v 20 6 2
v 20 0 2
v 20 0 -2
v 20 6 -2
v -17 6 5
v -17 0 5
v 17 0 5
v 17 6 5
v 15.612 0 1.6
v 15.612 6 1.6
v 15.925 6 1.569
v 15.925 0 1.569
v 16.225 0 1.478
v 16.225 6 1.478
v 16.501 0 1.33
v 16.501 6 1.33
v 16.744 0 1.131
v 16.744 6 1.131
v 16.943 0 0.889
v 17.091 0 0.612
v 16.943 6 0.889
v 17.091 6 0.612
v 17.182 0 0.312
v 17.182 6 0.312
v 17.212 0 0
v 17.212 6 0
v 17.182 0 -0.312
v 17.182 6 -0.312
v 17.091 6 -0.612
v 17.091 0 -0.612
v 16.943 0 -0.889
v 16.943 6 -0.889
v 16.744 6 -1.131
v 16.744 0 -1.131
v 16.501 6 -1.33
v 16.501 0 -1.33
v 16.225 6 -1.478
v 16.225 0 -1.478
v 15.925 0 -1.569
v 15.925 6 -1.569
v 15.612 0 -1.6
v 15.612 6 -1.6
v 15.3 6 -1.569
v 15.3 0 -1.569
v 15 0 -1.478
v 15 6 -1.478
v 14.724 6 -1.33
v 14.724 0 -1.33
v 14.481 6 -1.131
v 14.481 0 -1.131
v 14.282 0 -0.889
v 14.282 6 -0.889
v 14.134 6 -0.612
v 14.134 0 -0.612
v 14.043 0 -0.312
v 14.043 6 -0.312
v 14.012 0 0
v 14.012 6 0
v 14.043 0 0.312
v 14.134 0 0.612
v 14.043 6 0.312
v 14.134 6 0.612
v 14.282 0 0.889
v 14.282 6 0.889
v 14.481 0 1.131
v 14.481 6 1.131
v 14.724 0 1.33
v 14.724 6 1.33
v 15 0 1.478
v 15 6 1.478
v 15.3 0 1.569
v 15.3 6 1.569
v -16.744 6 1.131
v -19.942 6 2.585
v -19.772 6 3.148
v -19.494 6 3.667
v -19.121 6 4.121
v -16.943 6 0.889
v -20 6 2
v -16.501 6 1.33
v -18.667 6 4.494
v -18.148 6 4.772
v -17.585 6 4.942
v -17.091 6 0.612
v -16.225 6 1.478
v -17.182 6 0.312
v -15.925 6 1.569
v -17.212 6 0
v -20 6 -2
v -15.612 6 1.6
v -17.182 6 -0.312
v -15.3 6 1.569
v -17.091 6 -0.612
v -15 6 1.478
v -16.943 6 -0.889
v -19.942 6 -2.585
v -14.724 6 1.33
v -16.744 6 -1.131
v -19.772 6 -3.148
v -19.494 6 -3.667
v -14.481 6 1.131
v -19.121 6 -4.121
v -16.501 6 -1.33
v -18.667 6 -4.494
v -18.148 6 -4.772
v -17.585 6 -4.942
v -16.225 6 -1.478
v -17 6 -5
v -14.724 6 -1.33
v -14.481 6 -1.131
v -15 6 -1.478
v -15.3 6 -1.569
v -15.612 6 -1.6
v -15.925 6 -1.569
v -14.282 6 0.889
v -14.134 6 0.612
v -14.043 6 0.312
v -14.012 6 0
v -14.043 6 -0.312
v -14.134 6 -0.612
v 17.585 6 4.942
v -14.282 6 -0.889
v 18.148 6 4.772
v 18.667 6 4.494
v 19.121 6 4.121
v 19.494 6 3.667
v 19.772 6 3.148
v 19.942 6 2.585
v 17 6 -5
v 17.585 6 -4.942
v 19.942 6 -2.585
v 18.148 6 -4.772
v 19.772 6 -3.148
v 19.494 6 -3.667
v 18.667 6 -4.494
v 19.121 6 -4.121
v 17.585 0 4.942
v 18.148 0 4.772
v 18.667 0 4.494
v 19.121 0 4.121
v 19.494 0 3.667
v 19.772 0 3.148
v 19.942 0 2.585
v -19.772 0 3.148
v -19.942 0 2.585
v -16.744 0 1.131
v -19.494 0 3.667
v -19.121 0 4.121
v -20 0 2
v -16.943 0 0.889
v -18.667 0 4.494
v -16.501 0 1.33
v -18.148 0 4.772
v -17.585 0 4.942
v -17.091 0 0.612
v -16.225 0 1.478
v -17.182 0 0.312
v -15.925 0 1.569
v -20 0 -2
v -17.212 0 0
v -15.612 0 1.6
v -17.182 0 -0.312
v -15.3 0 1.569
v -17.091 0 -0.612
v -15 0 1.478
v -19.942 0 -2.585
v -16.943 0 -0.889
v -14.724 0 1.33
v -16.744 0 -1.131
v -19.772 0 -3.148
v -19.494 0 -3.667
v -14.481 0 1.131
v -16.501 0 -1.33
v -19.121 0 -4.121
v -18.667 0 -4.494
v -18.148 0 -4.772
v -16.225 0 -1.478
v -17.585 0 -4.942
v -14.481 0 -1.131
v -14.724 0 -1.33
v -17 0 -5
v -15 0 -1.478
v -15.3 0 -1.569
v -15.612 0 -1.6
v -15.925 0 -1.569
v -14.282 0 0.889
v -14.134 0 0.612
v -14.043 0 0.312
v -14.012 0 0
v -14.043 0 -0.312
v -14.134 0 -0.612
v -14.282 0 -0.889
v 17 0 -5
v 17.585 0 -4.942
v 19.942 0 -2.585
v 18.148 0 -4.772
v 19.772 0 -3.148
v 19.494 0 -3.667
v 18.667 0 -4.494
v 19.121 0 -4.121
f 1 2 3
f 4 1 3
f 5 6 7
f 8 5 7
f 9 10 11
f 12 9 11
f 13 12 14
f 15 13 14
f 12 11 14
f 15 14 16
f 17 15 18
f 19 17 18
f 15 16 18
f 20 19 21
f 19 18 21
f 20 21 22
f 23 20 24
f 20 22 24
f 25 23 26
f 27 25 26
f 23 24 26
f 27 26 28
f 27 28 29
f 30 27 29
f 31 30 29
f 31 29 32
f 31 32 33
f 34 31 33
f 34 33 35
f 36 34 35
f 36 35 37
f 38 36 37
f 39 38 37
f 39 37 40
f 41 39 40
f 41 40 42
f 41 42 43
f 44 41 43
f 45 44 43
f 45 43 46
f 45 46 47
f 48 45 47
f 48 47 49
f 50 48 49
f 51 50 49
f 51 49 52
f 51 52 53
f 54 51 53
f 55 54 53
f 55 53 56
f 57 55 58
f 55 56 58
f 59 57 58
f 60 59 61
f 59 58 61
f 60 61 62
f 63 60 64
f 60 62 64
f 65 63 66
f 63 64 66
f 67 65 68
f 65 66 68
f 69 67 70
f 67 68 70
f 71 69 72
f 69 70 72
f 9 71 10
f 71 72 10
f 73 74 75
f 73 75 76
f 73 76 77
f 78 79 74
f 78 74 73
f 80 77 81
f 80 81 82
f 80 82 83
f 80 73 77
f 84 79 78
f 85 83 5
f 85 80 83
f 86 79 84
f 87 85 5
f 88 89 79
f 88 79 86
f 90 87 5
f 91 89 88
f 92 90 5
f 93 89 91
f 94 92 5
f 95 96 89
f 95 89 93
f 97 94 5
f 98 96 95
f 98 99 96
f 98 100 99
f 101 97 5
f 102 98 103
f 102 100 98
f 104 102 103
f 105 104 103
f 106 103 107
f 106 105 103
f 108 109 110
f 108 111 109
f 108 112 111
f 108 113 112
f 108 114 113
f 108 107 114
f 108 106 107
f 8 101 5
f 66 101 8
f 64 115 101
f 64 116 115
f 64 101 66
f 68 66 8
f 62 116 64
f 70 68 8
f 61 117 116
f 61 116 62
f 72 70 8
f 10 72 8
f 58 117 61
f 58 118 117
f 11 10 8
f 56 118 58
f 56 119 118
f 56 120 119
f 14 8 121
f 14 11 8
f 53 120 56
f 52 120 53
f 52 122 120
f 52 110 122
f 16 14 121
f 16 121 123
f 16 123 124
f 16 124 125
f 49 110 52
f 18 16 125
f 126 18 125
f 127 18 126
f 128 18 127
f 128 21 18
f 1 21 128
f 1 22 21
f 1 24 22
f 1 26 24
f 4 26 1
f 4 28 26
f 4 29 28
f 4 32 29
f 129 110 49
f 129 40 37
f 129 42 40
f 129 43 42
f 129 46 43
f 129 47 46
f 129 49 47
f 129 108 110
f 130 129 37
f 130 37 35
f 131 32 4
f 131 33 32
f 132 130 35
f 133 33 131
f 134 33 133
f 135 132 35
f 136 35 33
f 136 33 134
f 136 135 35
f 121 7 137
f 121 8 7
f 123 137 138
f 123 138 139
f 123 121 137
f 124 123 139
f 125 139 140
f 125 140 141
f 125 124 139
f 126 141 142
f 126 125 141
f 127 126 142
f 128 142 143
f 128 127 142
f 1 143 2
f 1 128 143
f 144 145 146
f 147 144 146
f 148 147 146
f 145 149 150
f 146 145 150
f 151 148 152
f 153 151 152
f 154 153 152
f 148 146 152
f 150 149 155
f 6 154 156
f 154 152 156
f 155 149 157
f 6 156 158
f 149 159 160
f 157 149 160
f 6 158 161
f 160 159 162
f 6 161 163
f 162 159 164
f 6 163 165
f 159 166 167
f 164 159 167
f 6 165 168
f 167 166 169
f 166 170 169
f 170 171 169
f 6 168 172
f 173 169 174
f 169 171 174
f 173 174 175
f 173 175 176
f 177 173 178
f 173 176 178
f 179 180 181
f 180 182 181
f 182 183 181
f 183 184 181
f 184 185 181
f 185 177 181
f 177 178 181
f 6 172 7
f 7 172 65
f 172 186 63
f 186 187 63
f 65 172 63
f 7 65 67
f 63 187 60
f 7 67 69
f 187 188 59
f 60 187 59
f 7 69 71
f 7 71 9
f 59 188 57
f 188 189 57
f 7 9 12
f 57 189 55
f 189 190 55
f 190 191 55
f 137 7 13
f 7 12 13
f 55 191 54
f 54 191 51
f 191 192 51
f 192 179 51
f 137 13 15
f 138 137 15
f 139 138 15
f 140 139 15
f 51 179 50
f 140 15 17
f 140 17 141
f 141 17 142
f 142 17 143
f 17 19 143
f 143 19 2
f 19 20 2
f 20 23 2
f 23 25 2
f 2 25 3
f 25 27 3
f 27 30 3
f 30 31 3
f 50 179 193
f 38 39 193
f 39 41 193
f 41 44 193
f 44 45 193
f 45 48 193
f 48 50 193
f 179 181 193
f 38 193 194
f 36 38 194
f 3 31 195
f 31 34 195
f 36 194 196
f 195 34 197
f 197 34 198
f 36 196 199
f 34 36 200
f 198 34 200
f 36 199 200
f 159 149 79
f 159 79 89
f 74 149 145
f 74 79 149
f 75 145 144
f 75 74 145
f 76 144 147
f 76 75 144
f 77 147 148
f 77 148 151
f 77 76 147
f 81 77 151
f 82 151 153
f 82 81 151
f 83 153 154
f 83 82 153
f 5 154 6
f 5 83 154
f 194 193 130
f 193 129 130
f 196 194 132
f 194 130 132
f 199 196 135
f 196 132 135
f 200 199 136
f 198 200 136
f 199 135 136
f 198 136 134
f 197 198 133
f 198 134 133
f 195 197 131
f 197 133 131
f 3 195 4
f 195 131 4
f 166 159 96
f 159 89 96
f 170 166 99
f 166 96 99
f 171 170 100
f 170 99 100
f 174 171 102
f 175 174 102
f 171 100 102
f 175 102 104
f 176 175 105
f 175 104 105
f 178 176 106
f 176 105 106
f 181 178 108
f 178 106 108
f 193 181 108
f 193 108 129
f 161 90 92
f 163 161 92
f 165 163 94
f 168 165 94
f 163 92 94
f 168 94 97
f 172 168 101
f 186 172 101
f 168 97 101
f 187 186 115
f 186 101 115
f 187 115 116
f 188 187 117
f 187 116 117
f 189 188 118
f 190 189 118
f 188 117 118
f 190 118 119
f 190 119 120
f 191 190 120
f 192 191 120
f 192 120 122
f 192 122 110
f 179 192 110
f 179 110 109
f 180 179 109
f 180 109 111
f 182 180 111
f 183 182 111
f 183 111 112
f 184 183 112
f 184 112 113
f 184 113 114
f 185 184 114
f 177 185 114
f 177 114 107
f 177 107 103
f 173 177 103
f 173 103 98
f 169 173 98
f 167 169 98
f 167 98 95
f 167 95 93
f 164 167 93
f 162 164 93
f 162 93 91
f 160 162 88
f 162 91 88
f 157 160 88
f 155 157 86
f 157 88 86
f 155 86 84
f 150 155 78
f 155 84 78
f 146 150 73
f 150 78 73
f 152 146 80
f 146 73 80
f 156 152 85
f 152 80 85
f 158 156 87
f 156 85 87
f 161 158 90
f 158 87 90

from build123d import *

# Parameters (mm, degrees)
SKETCH_1_W          = 40
SKETCH_1_H          = 10
EXTRUDE_1_DEPTH     = 6
CUT_EXTRUDE_1_REACH = 23.471
SKETCH_2_R          = 1.6
FILLET_1_R          = 3


with BuildPart() as part:
    # 草图1 → 凸台-拉伸1 (new body)
    with BuildSketch(Plane(origin=(0, 0, 0), x_dir=(1, 0, 0), z_dir=(0, 1, 0))):
        Rectangle(SKETCH_1_W, SKETCH_1_H)
    extrude(amount=EXTRUDE_1_DEPTH)

    # 草图2 → 切除-拉伸1 (cut, up to next)
    with BuildSketch(Plane(origin=(0, 6, 0), x_dir=(1, 0, 0), z_dir=(0, 1, 0)), mode=Mode.PRIVATE) as cut_extrude_1_sk1:
        with Locations(Location((-15.612495, 0, 0), (0, 0, 270))):
            Circle(SKETCH_2_R)
    cut_extrude_1_tool1 = extrude(cut_extrude_1_sk1.sketch, amount=-CUT_EXTRUDE_1_REACH, mode=Mode.PRIVATE) & part.part
    # 草图2 → 切除-拉伸1 (cut, up to next)
    with BuildSketch(Plane(origin=(0, 6, 0), x_dir=(1, 0, 0), z_dir=(0, 1, 0)), mode=Mode.PRIVATE) as cut_extrude_1_sk2:
        with Locations(Location((15.612495, 0, 0), (0, 0, 270))):
            Circle(SKETCH_2_R)
    cut_extrude_1_tool2 = extrude(cut_extrude_1_sk2.sketch, amount=-CUT_EXTRUDE_1_REACH, mode=Mode.PRIVATE) & part.part
    add(cut_extrude_1_tool1.solids().sort_by_distance((-15.612495, 6, 0))[0], mode=Mode.SUBTRACT)
    add(cut_extrude_1_tool2.solids().sort_by_distance((15.612495, 6, 0))[0], mode=Mode.SUBTRACT)

    # 圆角1
    fillet_1_edges = [part.edges().sort_by_distance(p)[0] for p in [
        (20, 3, 5),
        (-20, 3, 5),
        (-20, 3, -5),
        (20, 3, -5),
    ]]
    fillet(fillet_1_edges, radius=FILLET_1_R)


solid = part.part
